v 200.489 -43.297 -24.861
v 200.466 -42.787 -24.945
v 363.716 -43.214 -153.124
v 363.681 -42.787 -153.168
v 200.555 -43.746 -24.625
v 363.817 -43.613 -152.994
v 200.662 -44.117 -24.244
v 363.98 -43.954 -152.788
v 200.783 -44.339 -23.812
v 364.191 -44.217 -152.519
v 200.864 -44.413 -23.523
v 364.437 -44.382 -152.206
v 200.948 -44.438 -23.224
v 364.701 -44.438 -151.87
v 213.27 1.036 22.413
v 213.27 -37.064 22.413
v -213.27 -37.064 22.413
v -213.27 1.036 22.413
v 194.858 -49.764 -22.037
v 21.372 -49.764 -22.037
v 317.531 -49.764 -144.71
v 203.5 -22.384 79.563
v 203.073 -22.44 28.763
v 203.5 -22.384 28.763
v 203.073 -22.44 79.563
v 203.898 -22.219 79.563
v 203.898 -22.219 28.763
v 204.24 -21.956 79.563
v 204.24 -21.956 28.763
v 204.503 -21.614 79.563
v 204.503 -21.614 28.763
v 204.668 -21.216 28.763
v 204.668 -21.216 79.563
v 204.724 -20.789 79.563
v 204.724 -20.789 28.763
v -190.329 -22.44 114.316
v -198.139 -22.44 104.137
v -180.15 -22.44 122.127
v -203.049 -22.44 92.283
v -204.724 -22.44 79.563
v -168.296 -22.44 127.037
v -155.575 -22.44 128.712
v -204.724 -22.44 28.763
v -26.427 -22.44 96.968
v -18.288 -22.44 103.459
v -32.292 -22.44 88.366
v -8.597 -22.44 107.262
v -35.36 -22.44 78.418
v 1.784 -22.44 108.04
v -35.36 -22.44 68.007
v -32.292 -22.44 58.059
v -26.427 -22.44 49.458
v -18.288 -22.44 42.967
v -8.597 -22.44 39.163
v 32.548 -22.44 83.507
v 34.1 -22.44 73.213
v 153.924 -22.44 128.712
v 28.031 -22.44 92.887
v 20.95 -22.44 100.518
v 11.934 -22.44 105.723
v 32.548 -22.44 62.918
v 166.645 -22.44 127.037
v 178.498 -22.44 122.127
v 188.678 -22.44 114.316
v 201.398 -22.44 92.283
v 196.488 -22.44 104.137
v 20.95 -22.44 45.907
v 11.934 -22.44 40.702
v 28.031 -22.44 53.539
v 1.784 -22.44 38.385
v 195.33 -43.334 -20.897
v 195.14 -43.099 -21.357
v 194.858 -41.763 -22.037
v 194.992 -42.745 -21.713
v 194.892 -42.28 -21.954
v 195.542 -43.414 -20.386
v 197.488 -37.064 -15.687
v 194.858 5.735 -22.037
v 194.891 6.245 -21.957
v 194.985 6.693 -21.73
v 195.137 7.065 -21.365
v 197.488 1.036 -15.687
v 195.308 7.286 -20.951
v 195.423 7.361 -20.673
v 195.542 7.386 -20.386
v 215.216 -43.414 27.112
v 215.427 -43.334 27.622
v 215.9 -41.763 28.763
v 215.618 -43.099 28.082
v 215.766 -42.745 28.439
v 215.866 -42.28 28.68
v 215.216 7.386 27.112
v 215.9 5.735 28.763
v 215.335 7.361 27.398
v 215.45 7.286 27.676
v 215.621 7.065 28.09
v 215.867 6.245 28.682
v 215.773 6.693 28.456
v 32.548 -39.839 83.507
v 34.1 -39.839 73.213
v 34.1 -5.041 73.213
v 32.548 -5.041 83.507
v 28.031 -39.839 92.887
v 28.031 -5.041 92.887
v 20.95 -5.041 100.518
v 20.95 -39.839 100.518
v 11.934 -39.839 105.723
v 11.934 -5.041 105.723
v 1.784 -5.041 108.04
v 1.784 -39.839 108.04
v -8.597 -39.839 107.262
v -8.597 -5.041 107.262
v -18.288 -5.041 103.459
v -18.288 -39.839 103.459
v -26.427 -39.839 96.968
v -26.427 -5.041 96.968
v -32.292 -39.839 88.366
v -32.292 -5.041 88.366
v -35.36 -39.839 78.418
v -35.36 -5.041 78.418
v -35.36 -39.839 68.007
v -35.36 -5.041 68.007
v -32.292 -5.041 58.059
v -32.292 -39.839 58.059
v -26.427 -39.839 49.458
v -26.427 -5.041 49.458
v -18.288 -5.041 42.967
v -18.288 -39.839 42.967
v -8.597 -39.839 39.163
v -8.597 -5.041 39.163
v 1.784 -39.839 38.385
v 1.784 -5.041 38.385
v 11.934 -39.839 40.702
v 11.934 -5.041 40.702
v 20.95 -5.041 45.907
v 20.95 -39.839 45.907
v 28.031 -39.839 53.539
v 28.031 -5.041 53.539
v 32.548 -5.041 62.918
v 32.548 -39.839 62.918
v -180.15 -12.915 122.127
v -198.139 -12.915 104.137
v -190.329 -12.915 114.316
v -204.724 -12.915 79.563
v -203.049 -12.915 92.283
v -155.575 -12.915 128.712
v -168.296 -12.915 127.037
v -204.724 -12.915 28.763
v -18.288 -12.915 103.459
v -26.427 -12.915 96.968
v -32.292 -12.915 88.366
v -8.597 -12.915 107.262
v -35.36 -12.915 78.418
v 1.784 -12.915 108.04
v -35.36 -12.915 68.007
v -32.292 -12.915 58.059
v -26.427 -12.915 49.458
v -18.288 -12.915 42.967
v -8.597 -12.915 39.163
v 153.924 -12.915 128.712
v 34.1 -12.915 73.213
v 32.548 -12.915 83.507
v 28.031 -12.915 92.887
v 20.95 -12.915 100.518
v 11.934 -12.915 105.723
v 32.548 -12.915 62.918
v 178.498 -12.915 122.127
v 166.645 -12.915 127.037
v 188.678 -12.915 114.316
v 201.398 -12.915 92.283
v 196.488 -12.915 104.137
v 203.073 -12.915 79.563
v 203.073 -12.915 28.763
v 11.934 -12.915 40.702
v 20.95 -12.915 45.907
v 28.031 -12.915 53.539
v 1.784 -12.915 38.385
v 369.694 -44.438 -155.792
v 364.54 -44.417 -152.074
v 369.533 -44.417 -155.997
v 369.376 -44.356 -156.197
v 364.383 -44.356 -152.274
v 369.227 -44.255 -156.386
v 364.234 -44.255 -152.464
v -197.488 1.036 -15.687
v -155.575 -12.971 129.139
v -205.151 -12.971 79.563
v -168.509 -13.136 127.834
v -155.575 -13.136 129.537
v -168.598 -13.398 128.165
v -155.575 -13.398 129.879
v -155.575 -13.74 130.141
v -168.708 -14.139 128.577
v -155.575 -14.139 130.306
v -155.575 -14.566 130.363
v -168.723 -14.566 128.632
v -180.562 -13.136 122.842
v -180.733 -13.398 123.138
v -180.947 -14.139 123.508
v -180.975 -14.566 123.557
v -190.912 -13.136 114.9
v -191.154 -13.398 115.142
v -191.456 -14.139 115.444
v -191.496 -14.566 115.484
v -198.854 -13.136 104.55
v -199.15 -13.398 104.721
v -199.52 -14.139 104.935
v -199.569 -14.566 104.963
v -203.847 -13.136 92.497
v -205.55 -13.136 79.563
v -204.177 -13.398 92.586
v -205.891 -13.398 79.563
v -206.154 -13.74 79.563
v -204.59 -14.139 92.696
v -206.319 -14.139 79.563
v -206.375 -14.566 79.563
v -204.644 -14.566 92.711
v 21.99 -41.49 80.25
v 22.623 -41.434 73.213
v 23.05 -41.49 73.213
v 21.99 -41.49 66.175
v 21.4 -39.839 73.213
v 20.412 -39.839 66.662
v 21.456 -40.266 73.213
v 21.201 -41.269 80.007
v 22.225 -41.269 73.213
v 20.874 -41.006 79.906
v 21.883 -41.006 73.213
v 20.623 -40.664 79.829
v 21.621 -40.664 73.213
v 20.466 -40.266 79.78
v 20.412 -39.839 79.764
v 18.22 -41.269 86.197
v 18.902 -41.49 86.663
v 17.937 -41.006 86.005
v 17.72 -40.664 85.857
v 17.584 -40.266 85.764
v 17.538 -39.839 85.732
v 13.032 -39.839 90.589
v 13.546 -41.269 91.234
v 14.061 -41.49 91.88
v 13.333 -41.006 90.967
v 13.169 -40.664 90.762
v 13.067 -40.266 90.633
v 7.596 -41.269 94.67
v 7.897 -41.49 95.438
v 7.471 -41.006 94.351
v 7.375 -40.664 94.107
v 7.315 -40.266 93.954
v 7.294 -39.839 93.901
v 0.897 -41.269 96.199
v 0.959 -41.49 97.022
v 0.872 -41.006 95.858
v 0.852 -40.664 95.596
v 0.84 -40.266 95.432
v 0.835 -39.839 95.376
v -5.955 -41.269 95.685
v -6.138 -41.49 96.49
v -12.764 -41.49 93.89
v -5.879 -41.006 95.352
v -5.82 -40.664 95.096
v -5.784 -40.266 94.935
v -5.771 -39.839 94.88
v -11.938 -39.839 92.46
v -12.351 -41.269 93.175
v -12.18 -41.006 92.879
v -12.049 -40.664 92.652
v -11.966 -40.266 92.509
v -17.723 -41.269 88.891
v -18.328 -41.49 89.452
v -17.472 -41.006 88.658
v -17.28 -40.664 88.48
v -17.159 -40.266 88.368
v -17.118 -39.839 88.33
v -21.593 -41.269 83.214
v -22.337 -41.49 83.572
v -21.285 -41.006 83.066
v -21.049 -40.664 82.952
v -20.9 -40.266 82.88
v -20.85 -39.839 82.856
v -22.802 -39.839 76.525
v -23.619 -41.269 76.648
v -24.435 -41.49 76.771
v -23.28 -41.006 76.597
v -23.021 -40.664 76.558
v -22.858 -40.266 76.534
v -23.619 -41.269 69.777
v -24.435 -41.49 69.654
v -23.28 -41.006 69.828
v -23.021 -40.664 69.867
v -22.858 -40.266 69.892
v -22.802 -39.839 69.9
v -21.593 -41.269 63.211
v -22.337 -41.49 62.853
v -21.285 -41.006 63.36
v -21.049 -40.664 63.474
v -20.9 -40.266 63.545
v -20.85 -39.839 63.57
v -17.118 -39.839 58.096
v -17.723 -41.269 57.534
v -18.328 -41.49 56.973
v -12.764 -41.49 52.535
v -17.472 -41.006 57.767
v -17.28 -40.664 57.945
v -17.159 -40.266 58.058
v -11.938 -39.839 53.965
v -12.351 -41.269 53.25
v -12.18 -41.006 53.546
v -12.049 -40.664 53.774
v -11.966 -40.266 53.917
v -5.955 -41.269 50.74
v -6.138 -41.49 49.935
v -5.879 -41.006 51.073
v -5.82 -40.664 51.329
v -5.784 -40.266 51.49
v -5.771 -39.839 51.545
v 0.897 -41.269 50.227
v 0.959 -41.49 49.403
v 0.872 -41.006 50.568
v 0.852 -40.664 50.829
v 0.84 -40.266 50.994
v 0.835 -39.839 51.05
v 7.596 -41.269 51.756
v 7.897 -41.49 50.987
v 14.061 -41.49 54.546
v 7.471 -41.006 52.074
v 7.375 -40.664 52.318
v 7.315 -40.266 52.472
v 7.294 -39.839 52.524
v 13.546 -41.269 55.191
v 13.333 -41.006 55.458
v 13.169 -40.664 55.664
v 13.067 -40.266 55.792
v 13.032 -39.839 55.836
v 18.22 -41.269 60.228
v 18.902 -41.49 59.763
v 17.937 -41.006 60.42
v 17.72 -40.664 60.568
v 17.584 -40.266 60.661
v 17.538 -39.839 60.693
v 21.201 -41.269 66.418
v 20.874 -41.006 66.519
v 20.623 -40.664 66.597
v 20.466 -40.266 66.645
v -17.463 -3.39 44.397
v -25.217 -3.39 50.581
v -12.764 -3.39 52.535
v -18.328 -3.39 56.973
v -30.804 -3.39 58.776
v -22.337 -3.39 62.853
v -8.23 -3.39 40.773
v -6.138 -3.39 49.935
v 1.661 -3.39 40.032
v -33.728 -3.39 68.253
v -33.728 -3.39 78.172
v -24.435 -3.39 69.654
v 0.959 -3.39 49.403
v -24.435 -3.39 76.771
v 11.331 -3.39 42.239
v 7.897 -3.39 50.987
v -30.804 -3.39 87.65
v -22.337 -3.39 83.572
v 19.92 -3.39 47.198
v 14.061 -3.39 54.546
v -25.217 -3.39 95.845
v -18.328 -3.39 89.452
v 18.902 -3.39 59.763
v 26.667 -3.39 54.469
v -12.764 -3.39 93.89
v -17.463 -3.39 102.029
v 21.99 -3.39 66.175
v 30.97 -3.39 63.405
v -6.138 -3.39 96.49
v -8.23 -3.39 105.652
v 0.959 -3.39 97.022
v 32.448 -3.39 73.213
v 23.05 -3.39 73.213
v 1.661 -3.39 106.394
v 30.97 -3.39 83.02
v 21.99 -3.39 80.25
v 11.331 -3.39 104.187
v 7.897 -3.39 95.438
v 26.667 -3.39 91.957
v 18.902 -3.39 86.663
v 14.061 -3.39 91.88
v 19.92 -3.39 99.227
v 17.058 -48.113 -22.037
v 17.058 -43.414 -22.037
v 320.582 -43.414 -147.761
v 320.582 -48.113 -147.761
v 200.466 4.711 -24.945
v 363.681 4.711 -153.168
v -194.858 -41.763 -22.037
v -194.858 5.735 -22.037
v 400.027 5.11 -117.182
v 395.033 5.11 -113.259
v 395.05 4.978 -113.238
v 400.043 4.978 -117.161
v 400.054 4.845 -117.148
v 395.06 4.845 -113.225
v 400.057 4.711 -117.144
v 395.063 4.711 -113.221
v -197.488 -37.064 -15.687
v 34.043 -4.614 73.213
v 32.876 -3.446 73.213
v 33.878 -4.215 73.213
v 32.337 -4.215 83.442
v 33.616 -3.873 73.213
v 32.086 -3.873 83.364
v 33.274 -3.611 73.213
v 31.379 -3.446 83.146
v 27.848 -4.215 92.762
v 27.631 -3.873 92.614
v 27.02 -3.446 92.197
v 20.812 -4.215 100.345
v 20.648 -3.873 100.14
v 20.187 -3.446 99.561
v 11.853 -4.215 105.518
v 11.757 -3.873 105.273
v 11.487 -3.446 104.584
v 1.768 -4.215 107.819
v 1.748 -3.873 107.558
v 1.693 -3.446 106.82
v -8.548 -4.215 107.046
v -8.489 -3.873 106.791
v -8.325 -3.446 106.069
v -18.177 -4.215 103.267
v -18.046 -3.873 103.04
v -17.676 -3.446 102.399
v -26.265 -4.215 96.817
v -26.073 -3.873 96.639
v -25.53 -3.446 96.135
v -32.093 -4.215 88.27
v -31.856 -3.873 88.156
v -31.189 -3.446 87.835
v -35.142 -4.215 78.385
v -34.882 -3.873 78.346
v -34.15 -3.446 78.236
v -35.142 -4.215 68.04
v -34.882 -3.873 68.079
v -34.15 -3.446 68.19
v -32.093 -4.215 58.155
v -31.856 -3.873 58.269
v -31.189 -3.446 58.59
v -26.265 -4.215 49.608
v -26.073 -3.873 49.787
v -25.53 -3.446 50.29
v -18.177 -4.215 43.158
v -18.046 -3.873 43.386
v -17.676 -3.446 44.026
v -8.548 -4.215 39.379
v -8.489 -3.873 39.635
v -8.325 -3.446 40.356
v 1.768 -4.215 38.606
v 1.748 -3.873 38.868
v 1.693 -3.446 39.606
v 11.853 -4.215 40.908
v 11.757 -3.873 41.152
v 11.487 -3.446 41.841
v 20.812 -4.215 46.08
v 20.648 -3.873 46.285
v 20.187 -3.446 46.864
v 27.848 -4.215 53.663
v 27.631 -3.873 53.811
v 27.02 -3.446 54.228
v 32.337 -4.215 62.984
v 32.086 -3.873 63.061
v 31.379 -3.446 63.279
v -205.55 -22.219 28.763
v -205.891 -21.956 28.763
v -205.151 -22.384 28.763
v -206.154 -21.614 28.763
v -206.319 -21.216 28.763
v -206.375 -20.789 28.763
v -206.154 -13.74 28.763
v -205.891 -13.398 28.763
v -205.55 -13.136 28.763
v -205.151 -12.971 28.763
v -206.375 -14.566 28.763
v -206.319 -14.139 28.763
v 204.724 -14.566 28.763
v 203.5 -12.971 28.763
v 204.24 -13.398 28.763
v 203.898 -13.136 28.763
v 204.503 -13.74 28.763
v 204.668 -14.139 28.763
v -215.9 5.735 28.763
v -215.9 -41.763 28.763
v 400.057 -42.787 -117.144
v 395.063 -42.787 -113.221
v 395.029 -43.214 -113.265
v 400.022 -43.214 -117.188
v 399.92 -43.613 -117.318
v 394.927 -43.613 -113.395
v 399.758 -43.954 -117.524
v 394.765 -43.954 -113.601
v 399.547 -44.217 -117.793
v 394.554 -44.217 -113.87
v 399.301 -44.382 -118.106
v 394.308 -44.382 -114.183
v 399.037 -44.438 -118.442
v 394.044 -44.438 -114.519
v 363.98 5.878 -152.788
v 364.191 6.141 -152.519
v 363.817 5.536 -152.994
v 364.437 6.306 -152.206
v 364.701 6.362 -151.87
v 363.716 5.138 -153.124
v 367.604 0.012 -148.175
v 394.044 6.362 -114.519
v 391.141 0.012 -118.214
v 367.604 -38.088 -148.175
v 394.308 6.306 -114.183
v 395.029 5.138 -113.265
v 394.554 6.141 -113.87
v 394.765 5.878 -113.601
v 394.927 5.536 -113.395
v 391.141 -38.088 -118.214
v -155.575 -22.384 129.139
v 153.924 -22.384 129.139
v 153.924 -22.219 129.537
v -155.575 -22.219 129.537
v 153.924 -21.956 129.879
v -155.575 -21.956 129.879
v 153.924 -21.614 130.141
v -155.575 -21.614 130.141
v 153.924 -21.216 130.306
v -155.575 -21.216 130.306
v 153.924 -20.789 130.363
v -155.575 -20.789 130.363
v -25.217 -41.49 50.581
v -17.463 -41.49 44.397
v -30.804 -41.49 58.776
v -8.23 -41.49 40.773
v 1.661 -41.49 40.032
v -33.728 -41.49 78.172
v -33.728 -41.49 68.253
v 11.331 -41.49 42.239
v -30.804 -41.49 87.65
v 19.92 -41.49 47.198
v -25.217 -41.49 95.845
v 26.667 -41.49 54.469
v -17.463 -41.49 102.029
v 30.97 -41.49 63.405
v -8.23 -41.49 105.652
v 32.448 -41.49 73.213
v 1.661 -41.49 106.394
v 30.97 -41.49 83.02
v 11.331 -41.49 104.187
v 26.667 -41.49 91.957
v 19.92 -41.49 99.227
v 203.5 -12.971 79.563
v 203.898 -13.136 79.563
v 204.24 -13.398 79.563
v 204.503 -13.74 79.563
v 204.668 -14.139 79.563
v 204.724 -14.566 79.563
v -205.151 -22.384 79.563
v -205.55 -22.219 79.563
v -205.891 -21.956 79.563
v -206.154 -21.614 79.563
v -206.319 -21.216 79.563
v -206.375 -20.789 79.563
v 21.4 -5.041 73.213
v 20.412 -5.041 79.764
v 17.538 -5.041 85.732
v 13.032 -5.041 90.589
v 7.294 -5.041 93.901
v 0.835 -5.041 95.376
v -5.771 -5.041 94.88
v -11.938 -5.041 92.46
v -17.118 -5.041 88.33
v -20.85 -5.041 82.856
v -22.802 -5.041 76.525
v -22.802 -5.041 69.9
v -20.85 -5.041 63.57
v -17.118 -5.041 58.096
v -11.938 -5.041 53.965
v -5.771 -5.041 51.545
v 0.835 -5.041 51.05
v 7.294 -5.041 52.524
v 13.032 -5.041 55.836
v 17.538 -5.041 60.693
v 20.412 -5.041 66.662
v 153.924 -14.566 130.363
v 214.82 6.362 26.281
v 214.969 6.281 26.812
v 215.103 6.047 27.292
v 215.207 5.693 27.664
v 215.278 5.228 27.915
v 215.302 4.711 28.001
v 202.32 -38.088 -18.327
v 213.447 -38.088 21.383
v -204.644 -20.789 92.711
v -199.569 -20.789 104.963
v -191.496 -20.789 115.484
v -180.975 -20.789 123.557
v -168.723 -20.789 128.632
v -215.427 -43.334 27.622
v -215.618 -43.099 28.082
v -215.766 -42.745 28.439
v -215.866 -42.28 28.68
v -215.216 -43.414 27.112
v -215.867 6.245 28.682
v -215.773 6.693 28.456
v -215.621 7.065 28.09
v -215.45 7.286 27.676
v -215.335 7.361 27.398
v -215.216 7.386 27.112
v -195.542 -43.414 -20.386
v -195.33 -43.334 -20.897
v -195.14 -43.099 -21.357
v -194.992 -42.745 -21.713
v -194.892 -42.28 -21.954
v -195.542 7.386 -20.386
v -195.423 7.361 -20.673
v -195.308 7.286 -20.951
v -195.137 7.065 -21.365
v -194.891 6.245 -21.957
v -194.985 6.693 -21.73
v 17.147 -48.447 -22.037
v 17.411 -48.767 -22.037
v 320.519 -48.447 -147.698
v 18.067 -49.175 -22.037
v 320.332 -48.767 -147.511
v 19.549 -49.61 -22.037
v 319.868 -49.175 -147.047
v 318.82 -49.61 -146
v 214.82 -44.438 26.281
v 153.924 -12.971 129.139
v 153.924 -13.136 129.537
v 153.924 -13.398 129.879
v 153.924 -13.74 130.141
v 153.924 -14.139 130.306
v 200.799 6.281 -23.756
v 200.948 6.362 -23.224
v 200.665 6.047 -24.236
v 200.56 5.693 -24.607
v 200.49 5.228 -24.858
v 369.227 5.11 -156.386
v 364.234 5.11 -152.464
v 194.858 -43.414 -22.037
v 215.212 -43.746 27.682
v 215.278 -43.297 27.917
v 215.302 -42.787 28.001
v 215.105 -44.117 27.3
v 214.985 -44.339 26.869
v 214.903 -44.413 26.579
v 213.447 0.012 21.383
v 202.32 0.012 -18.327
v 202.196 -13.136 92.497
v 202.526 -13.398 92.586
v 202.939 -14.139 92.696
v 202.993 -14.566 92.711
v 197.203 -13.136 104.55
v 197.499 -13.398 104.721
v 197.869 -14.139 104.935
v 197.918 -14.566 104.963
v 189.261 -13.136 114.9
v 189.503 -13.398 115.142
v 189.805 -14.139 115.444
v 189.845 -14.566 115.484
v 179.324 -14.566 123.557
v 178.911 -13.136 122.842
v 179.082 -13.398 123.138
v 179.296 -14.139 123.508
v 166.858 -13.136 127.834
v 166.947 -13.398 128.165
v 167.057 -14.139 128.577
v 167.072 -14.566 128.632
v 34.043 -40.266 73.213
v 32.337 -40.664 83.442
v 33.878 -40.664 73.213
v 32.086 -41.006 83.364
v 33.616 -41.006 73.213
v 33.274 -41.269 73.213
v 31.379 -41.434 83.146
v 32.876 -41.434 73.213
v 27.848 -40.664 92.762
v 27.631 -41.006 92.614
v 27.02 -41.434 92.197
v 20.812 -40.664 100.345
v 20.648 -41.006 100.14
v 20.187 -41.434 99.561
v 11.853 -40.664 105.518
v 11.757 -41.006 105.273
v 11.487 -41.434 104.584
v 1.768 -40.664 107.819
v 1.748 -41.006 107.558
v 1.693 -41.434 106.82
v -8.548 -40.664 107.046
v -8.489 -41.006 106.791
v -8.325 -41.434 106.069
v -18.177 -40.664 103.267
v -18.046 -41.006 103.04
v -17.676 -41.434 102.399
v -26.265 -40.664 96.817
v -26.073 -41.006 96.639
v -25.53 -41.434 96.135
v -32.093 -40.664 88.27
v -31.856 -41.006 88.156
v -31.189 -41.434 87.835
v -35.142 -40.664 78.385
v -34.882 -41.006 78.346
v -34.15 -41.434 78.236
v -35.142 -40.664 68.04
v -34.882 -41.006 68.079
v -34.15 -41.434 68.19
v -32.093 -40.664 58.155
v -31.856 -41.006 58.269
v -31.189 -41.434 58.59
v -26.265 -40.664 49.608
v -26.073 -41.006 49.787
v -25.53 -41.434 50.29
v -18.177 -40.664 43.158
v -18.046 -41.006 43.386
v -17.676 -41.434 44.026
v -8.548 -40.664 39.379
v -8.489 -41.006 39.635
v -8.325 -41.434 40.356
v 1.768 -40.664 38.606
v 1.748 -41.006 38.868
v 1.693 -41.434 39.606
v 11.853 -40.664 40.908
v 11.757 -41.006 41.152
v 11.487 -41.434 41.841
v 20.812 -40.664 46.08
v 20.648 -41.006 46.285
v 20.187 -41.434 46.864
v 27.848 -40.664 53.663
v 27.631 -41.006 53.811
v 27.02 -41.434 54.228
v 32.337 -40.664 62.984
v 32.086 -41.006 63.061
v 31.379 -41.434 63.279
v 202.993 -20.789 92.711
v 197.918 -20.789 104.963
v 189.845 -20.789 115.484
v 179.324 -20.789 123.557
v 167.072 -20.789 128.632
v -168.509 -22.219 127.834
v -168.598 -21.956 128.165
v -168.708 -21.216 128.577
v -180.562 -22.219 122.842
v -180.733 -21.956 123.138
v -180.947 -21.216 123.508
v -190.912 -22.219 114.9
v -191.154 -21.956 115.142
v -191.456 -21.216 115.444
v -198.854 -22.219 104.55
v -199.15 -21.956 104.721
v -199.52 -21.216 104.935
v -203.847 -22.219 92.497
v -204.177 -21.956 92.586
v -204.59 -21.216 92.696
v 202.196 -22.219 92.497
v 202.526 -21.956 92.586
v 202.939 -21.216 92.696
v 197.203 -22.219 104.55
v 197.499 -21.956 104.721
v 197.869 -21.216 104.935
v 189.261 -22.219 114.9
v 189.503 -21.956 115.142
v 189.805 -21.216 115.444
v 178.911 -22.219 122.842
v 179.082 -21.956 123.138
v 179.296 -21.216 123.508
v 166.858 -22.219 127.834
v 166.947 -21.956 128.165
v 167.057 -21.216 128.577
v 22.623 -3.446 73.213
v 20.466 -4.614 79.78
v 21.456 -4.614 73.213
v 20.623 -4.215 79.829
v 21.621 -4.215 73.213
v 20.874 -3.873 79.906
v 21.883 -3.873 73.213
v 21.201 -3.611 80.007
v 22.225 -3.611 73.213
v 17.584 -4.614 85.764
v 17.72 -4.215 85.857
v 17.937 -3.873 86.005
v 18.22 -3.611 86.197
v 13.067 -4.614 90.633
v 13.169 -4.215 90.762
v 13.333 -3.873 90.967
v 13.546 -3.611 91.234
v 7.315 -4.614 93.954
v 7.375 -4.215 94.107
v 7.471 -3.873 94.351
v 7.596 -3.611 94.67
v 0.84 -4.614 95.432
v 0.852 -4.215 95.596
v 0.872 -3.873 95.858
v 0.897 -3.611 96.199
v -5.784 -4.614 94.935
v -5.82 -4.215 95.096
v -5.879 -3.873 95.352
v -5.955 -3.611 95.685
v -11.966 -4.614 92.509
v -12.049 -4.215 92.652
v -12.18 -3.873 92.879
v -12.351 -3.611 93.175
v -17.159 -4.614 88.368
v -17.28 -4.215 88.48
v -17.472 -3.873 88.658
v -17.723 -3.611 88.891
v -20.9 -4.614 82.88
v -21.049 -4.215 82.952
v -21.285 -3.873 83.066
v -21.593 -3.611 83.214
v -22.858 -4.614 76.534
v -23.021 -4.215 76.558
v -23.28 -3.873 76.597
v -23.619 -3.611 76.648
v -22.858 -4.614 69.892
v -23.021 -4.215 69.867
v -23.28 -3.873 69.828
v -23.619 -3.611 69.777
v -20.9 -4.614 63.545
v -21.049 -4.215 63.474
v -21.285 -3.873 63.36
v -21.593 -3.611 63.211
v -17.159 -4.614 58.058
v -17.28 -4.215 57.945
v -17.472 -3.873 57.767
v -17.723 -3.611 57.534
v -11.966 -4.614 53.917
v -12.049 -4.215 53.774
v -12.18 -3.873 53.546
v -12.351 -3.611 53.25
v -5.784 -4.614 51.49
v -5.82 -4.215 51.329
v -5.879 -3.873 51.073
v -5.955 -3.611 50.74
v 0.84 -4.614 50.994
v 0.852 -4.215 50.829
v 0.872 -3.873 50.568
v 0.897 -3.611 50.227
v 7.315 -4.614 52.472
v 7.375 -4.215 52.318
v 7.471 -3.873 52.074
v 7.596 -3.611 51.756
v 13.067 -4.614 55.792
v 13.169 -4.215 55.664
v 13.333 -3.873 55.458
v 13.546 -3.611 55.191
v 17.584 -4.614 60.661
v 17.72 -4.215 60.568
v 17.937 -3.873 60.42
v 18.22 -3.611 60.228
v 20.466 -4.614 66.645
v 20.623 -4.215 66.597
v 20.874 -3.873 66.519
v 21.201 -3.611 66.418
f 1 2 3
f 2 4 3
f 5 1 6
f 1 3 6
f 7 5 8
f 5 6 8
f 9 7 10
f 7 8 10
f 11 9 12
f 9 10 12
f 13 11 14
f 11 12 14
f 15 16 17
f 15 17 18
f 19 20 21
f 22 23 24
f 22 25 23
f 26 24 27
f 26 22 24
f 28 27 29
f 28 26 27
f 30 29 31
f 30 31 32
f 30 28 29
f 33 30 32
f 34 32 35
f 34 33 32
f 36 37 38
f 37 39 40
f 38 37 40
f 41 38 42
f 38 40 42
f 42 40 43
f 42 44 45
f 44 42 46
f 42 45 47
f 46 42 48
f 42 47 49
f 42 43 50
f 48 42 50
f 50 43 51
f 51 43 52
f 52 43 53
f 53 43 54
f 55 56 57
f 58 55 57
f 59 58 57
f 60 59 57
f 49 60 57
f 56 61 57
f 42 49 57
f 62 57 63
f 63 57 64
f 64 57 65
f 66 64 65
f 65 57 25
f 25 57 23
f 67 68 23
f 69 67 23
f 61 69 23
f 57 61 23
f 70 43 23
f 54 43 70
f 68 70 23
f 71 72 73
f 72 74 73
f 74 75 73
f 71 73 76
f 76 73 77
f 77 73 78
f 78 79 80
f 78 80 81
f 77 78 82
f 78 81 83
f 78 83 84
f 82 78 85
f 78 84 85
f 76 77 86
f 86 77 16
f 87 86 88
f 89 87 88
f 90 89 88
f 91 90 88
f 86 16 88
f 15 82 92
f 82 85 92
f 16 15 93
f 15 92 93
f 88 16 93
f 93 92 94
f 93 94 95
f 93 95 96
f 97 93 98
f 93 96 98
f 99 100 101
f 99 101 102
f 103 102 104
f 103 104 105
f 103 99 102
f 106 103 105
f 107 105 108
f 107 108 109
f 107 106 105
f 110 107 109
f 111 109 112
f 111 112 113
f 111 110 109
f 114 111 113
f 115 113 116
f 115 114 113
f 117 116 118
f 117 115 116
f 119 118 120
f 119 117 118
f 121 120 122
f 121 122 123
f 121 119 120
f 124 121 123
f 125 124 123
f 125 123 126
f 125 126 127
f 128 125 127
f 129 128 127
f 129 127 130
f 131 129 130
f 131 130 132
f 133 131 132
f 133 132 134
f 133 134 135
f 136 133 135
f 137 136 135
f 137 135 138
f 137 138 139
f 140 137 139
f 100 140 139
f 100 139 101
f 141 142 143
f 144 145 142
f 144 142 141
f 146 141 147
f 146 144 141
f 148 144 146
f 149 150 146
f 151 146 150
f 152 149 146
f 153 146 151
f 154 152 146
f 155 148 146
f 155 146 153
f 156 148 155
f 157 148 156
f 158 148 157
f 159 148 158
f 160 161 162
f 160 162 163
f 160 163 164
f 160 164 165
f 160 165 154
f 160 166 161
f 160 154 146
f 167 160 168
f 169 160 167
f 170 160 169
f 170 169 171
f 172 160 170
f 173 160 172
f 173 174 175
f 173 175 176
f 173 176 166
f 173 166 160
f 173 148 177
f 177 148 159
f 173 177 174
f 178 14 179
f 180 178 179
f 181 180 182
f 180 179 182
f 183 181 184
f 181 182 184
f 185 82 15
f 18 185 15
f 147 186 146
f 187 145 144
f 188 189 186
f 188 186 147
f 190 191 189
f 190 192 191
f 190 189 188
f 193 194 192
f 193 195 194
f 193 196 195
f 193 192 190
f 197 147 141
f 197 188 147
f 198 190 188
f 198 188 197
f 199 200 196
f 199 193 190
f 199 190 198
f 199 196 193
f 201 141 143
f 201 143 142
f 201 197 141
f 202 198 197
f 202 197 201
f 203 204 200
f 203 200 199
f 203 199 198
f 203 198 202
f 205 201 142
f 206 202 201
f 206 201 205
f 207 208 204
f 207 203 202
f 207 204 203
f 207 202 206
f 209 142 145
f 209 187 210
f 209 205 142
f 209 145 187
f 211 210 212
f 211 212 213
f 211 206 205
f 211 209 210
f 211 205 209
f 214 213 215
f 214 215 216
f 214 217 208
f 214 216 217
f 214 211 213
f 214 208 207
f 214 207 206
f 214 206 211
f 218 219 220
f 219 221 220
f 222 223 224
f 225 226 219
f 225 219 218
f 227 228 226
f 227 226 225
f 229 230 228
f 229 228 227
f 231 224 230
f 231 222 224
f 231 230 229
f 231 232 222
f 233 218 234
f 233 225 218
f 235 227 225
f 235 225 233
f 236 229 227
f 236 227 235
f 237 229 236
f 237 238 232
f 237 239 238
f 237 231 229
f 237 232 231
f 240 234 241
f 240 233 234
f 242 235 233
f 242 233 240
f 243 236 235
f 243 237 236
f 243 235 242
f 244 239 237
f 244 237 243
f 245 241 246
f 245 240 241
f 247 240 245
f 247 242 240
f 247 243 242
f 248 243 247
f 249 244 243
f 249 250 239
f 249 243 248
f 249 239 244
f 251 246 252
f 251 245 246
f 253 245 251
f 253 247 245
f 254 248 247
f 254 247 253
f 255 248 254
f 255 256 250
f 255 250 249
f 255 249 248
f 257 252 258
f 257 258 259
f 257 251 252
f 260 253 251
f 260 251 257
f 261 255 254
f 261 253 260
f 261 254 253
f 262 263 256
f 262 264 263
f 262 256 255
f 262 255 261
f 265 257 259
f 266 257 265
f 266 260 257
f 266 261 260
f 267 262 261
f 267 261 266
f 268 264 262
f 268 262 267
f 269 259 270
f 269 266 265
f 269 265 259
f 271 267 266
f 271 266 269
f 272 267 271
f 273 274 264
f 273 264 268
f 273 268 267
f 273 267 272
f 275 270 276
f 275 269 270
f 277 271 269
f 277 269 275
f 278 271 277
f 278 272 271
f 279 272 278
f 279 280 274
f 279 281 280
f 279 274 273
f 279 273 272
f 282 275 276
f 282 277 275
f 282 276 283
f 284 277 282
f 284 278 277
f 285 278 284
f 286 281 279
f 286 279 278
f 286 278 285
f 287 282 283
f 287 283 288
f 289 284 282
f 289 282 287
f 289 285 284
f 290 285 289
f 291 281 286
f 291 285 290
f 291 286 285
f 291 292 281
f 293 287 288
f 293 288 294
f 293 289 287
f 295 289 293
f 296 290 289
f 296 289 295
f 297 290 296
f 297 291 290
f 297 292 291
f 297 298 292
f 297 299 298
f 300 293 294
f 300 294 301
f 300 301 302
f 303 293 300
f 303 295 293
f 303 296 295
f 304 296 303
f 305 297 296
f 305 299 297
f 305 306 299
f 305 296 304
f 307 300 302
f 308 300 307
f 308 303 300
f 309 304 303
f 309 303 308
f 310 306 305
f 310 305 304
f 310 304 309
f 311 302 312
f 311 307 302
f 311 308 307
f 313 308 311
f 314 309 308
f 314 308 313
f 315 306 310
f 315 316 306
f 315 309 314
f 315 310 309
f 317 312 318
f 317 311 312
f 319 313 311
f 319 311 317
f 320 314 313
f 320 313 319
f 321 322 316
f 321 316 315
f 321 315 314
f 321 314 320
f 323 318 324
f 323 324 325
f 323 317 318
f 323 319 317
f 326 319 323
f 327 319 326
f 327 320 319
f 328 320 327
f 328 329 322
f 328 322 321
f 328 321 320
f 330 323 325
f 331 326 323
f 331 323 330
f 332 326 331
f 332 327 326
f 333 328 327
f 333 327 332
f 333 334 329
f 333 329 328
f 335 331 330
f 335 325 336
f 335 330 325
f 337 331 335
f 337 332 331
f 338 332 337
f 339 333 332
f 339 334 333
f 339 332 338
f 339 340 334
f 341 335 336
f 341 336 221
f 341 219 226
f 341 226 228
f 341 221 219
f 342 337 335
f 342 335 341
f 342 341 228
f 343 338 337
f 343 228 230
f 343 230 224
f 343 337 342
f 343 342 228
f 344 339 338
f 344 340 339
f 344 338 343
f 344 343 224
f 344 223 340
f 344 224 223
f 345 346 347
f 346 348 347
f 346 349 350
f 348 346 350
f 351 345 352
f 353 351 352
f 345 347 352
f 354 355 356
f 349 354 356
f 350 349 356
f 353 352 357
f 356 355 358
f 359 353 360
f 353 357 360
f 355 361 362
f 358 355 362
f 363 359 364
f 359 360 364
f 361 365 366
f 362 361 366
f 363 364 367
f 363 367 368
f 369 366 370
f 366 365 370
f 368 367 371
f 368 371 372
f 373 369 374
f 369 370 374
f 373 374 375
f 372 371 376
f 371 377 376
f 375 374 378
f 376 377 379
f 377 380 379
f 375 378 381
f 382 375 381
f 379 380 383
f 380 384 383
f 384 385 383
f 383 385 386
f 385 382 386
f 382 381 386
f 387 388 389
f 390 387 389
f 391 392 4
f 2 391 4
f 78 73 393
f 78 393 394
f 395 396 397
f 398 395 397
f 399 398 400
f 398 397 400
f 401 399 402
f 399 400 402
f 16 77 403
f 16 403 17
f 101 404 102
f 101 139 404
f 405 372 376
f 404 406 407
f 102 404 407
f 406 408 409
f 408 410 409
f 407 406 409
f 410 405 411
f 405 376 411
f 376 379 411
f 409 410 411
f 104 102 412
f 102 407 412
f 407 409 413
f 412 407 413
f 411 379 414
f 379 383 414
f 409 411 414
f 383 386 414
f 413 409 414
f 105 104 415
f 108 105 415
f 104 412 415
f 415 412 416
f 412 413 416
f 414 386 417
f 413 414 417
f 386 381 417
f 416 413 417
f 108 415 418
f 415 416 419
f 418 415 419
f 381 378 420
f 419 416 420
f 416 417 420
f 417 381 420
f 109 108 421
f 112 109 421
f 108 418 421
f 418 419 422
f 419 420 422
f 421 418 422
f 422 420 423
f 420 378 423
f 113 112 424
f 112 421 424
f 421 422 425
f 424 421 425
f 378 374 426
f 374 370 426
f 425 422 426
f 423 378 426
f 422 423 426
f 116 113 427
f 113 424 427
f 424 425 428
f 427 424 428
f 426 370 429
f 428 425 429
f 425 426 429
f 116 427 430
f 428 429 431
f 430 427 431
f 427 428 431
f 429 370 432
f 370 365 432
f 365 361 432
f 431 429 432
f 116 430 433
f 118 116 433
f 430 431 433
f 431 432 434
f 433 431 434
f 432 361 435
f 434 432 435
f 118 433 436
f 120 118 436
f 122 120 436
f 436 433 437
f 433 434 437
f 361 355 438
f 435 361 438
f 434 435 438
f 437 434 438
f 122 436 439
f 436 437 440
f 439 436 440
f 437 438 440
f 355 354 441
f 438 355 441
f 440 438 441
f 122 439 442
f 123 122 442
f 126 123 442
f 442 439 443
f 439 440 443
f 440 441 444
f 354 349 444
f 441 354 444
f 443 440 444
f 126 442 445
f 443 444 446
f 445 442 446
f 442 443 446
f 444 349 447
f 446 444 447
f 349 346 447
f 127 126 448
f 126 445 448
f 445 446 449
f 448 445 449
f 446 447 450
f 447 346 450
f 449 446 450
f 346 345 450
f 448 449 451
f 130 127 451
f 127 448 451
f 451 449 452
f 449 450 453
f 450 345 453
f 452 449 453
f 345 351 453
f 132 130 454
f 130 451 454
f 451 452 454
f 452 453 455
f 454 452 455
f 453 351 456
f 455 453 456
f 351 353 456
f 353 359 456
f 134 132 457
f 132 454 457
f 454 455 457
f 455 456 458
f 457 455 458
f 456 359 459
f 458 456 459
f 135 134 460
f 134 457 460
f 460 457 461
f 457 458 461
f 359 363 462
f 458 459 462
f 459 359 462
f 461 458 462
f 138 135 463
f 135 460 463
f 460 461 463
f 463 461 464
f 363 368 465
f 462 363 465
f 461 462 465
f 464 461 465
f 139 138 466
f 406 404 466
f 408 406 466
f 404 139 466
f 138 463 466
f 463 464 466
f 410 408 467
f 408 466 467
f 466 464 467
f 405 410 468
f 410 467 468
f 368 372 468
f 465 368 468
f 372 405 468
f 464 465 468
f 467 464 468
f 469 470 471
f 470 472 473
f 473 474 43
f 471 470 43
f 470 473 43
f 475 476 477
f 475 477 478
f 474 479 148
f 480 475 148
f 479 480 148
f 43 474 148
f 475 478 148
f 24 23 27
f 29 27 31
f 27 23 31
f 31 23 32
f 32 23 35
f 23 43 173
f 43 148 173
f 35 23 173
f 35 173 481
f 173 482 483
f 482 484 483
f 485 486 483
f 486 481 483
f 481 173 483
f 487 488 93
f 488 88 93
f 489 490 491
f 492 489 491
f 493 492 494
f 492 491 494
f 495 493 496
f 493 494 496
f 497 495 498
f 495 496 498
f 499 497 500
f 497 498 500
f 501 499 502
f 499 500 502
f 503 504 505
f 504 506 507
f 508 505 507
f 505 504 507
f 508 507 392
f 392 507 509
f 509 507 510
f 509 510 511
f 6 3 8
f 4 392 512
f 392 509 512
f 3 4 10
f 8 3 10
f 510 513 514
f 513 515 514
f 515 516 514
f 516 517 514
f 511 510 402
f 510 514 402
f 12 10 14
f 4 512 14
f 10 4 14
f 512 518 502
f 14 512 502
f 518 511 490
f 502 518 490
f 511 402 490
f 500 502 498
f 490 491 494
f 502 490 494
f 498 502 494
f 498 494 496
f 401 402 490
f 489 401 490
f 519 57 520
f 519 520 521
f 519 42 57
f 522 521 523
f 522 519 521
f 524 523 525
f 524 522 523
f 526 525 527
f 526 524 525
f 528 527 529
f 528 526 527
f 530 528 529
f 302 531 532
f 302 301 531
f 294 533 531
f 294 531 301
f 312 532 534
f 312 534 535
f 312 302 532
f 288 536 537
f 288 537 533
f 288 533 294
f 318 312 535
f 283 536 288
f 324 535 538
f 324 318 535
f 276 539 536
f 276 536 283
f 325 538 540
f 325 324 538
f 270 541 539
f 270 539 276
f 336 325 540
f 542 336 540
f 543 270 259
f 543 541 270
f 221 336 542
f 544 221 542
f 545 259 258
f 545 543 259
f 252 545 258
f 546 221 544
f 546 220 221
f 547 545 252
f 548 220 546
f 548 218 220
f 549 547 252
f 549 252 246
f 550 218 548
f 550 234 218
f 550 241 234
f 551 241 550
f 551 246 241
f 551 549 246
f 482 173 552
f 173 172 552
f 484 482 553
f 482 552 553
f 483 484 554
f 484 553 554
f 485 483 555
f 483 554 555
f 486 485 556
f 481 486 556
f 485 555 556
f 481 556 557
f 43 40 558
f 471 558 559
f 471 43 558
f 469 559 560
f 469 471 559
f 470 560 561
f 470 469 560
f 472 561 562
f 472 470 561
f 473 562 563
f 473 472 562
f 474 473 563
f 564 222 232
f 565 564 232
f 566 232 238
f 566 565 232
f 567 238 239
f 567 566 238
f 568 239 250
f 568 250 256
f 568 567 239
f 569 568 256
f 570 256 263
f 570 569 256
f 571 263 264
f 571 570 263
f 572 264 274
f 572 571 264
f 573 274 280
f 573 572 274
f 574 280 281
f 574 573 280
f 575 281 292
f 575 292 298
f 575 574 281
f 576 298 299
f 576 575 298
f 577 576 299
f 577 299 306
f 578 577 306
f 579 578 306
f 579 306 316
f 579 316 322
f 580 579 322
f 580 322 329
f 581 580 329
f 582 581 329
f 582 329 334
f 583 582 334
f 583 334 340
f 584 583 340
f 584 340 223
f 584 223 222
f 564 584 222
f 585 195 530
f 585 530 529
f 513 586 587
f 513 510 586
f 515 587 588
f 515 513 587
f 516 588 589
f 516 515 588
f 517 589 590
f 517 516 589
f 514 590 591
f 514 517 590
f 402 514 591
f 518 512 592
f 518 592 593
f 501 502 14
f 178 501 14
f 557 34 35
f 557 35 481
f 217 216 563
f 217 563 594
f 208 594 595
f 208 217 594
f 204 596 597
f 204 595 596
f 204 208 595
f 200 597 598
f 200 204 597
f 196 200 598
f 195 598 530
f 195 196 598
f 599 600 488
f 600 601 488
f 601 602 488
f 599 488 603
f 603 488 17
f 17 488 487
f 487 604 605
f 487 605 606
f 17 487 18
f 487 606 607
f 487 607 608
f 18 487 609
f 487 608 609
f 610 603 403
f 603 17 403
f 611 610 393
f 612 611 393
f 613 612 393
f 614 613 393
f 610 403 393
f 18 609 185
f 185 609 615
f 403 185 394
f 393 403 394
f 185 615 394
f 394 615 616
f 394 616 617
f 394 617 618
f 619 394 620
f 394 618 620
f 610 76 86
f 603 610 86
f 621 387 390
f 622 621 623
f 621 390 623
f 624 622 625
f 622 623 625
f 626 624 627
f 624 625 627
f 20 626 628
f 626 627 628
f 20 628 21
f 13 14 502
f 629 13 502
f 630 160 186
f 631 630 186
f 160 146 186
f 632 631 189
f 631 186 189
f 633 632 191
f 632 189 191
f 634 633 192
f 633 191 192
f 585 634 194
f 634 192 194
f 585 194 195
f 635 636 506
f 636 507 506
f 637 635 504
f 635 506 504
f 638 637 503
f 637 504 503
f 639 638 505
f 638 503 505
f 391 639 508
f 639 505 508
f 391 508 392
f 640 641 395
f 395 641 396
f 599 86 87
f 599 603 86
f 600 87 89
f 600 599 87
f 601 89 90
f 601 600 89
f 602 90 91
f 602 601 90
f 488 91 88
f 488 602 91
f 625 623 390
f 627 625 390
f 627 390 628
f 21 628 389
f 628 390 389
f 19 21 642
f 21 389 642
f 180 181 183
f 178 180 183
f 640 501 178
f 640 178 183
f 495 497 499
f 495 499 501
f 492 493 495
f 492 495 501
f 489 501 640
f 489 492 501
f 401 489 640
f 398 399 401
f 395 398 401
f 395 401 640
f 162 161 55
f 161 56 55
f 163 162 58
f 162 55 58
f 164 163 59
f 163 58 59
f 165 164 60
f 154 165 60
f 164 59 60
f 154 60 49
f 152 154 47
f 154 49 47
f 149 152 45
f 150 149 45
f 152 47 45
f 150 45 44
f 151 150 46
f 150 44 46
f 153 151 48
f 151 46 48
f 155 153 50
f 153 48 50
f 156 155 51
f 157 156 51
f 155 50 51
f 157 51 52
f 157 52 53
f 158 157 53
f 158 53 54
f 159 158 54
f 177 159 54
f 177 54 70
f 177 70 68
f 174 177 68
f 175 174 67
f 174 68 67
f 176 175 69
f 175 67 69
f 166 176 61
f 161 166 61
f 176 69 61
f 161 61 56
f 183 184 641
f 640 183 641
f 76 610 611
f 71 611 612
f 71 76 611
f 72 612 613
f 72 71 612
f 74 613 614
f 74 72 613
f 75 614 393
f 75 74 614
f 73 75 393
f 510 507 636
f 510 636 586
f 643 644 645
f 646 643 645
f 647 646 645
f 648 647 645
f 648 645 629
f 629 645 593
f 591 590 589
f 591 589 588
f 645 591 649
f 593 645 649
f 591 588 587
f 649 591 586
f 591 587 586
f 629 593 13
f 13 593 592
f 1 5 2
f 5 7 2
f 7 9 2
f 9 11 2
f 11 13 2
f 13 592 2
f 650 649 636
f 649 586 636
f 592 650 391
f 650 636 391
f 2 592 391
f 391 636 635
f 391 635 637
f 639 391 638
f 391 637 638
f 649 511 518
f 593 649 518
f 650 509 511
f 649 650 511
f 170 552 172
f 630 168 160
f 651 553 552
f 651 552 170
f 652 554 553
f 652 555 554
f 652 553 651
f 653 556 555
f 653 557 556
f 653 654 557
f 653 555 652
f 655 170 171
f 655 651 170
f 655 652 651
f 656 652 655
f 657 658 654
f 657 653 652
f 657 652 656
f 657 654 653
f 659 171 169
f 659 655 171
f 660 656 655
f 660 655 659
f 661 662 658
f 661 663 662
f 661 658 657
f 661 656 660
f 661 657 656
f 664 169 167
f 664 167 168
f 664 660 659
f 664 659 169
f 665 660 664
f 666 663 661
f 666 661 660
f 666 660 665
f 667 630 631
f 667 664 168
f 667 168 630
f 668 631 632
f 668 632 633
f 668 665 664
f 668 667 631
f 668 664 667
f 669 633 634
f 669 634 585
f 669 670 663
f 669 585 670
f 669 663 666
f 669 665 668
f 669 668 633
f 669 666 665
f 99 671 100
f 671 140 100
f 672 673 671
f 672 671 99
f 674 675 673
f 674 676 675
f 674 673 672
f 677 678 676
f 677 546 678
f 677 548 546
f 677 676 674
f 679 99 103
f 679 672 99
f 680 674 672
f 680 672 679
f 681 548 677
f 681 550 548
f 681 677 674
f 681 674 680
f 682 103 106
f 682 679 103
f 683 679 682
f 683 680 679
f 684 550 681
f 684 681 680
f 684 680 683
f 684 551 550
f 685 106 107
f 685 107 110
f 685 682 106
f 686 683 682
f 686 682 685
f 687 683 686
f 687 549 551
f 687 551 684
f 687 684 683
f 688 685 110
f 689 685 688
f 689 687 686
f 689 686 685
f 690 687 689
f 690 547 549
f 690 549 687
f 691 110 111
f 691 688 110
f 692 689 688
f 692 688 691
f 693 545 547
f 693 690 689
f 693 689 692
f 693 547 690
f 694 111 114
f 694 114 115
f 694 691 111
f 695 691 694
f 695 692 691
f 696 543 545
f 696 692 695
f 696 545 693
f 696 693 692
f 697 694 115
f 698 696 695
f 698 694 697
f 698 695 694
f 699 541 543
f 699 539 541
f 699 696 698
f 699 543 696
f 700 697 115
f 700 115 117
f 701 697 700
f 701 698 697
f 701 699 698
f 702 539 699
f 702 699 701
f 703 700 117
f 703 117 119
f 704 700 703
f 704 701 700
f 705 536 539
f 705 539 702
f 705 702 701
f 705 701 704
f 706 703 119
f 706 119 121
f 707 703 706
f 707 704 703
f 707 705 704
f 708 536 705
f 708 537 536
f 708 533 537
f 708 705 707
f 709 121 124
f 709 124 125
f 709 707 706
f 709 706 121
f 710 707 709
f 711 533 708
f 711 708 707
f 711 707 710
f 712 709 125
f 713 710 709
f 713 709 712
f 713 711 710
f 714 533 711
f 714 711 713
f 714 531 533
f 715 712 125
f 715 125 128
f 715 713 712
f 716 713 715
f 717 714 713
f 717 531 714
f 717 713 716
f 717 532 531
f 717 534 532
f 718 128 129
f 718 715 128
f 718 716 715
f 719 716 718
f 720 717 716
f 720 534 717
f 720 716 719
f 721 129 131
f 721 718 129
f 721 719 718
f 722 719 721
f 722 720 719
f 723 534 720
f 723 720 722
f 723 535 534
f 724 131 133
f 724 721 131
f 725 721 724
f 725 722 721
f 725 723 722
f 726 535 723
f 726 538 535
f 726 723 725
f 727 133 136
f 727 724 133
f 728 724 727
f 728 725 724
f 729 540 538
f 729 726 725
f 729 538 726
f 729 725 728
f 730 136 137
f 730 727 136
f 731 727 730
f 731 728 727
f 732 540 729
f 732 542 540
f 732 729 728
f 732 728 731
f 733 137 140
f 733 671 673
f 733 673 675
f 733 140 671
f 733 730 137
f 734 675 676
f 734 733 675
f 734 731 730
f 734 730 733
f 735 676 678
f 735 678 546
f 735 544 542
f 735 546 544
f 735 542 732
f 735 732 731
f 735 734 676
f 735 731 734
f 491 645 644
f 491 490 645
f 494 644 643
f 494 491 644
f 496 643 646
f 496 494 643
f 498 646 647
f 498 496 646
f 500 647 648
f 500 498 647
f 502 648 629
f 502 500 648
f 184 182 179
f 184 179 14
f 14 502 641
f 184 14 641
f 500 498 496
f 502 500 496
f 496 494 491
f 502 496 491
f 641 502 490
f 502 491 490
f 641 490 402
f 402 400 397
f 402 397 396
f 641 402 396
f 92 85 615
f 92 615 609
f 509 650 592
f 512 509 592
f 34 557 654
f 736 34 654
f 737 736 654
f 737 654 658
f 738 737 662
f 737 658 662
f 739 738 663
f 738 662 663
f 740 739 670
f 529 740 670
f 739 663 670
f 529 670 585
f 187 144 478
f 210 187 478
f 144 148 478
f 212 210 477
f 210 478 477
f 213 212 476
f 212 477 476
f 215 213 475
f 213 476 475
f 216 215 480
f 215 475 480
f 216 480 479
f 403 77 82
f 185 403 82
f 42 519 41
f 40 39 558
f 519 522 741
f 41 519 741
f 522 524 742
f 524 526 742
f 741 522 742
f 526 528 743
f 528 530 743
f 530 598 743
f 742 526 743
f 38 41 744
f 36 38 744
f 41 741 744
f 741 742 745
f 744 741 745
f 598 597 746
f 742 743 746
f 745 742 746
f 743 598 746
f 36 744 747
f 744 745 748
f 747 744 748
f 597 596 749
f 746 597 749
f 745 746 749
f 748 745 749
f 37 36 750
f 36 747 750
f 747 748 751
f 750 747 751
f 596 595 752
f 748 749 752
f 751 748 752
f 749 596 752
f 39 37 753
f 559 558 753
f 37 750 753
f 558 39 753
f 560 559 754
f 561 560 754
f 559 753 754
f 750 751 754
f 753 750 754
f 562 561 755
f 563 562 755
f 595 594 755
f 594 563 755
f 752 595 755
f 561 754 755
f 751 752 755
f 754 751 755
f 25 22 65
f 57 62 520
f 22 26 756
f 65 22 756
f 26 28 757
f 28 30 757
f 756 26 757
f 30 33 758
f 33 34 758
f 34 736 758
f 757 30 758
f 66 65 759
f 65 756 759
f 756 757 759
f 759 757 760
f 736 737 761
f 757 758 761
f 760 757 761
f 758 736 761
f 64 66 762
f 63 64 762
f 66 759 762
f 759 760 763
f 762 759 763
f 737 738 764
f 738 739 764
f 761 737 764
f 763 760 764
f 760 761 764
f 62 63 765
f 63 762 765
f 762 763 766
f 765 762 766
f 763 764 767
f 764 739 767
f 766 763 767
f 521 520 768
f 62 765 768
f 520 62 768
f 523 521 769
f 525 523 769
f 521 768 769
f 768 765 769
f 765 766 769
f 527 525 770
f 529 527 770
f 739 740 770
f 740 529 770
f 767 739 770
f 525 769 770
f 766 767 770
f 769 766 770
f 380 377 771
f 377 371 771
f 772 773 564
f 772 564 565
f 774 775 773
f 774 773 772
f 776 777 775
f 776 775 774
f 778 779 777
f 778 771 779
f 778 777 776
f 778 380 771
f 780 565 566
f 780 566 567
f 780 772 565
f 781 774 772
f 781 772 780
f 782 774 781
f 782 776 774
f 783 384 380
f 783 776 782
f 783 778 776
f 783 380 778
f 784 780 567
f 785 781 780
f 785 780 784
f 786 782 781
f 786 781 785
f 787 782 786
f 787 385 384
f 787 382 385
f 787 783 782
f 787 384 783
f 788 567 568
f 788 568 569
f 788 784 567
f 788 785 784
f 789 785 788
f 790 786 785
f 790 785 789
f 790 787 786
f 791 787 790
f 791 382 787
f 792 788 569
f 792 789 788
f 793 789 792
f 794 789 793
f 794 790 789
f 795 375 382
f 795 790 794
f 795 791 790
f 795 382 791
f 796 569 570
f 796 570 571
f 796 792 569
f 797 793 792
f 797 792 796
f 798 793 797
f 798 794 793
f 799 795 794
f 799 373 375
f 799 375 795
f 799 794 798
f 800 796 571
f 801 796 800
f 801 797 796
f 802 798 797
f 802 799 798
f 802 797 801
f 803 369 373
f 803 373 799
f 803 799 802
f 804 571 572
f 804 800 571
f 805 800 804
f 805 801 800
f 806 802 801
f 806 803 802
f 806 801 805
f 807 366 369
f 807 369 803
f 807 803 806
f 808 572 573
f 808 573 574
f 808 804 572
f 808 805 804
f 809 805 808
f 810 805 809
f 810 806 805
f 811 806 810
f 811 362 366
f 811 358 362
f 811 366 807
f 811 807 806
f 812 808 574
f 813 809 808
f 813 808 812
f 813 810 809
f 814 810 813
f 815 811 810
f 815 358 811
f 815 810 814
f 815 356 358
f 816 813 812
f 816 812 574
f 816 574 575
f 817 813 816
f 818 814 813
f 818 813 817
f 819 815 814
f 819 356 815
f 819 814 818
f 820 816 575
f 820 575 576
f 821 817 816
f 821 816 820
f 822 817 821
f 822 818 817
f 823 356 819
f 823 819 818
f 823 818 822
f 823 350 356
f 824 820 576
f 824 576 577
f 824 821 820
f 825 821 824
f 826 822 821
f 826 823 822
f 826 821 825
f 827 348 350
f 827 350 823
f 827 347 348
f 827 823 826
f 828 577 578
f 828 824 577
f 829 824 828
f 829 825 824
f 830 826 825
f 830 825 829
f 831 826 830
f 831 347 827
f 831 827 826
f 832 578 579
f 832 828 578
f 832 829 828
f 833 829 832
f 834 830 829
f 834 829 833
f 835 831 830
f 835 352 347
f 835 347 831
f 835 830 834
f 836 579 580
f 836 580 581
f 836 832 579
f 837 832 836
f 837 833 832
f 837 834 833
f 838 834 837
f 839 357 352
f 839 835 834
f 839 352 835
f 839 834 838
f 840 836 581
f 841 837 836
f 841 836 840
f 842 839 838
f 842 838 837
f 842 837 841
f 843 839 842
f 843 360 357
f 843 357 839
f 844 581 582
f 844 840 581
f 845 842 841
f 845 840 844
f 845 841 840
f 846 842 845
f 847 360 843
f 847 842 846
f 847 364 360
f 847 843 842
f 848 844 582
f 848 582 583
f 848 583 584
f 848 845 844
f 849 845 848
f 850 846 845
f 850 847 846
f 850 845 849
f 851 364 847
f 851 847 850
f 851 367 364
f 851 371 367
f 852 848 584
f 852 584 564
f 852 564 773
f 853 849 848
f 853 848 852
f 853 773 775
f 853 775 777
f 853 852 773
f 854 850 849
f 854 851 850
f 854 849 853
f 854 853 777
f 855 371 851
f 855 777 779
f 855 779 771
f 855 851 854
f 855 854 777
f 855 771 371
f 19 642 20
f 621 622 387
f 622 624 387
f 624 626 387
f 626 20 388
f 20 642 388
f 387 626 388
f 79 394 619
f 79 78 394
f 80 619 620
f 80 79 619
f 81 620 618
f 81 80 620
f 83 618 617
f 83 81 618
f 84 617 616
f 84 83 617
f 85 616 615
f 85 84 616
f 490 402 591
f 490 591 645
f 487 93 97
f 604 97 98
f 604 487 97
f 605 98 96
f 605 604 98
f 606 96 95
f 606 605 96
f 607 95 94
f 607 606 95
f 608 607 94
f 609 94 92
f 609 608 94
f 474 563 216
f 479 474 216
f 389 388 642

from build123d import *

# Parameters (mm, degrees)
F0_W      = 50.8
F0_H      = 50.8
F0_W_2    = 38.0999986082
F0_H_2    = 38.0999993041
F1_DEPTH  = 215.9
F3_DEPTH  = 50.801
F6_W      = 50.8
F6_H      = 50.8
F6_W_2    = 38.1000041962
F6_H_2    = 38.1000041962
F7_DEPTH  = 228.6
F9_DEPTH  = 50.801
F11_DEPTH = 6.35
F12_W     = 411.099
F12_H     = 9.525
F13_DEPTH = 101.6
F14_R     = 50.8
F15_R     = 22.225
F16_DEPTH = 25.4
F17_R     = 34.925
F17_R_2   = 22.225
F18_DEPTH = 19.05
F20_R     = 1.651
F20_2_R   = 1.651
F20_3_R   = 1.651
F20_4_R   = 1.651
F21_R     = 1.651
F22_W     = 38.1000041962
F22_H     = 38.1000041962
F23_DEPTH = 6.35


with BuildPart() as f1:
    # F0 (on Right) → F1 (new body, symmetric)
    with BuildSketch(Plane.YZ):
        with Locations((-18.0143257603, 3.3626770601)):
            Rectangle(F0_W, F0_H)
        with Locations((-18.0143257603, 3.362677408)):
            Rectangle(F0_W_2, F0_H_2, mode=Mode.SUBTRACT)
    extrude(amount=F1_DEPTH, both=True)

    # F2 (on face) → F3 (cut, through all)
    with BuildSketch(Plane(origin=(0, 7.3856742397, 0), x_dir=(-1, 0, 0), z_dir=(0, 1, 0))):
        Polygon((-194.8579510314, -22.0373229399), (-215.9, 28.7626770601), (-215.9, -22.0373229399), align=None)
        Polygon((215.9, -22.0373229399), (215.9, 28.7626770601), (194.8579510314, -22.0373229399), align=None)
    extrude(amount=-F3_DEPTH, mode=Mode.SUBTRACT)

    # F20
    f20_edges = [f1.edges().sort_by_distance(p)[0] for p in [
        (0, -43.414326, -22.037323),
        (0, -43.414326, 28.762677),
        (0, 7.385674, -22.037323),
        (0, 7.385674, 28.762677),
    ]]
    fillet(f20_edges, radius=F20_R)


with BuildPart() as f7:
    # F6 (on face) → F7 (new body)
    with BuildSketch(Plane(origin=(119.5313421825, 0, -93.9048466977), x_dir=(0, -1, 0), z_dir=(-0.7863587226, 0, 0.6177701509))):
        with Locations((19.0380490385, 129.6261847019)):
            Rectangle(F6_W, F6_H)
        with Locations((19.0380490385, 129.6261847019)):
            Rectangle(F6_W_2, F6_H_2, mode=Mode.SUBTRACT)
    extrude(amount=-F7_DEPTH)

    # F8 (on face) → F9 (cut, through all)
    with BuildSketch(Plane(origin=(0, 6.3619509615, 0), x_dir=(-1, 0, 0), z_dir=(0, 1, 0))):
        Polygon((-183.9191680339, -11.9456772311), (-215.3018916998, 28.0013458784), (-200.4657667823, -24.9448269977), align=None)
    extrude(amount=-F9_DEPTH, mode=Mode.SUBTRACT)

    # F20#2
    f20_2_edges = [f7.edges().sort_by_distance(p)[0] for p in [
        (282.073269, -44.438049, -89.05638),
        (305.182694, -44.438049, -42.609782),
        (305.182694, 6.361951, -42.609782),
        (282.073269, 6.361951, -89.05638),
    ]]
    fillet(f20_2_edges, radius=F20_2_R)


with BuildPart() as f11:
    # F10 (on face) → F11 (new body)
    with BuildSketch(Plane.XZ.offset(43.4143257603)):
        Polygon((320.5815367264, -147.7609086349), (194.8579510314, -22.0373229399), (17.0579510314, -22.0373229399), align=None)
    extrude(amount=F11_DEPTH)

    # F20#3
    f20_3_edges = [f11.edges().sort_by_distance(p)[0] for p in [
        (168.819744, -49.764326, -84.899116),
    ]]
    fillet(f20_3_edges, radius=F20_3_R)


with BuildPart() as f13:
    # F12 (on face) → F13 (new body)
    with BuildSketch(Plane.XY.offset(28.7626770601)):
        with Locations((-0.8255, -17.6774282008)):
            Rectangle(F12_W, F12_H)
    extrude(amount=F13_DEPTH)

    # F14
    f14_edges = [f13.edges().sort_by_distance(p)[0] for p in [
        (-206.375, -17.677428, 130.362677),
        (204.724, -17.677428, 130.362677),
    ]]
    fillet(f14_edges, radius=F14_R)

    # F15 (on face) → F16 (cut)
    with BuildSketch(Plane.XZ.offset(22.4399282008)):
        with Locations((-0.8255, 73.2126770601)):
            Circle(F15_R)
    extrude(amount=-F16_DEPTH, mode=Mode.SUBTRACT)


with BuildPart() as f18:
    # F17 (on face) → F18 (new body, symmetric)
    with BuildSketch(Plane.XZ.offset(22.4399282008)):
        with Locations((-0.8255, 73.2126770601)):
            Circle(F17_R)
        with Locations((-0.8255, 73.2126770601)):
            Circle(F17_R_2, mode=Mode.SUBTRACT)
    extrude(amount=F18_DEPTH, both=True)


with BuildPart() as f13_1:
    add(f13.part)

    # F19: cut F18
    add(f18.part, mode=Mode.SUBTRACT)

    # F20#4
    f20_4_edges = [f13_1.edges().sort_by_distance(p)[0] for p in [
        (204.724, -12.914928, 54.162677),
        (189.845024, -12.914928, 115.483702),
        (204.724, -22.439928, 54.162677),
    ]]
    fillet(f20_4_edges, radius=F20_4_R)


with BuildPart() as f18_1:
    add(f18.part)

    # F21
    f21_edges = [f18_1.edges().sort_by_distance(p)[0] for p in [
        (-23.0505, -3.389928, 73.212677),
        (-35.7505, -3.389928, 73.212677),
        (-23.0505, -41.489928, 73.212677),
        (-35.7505, -41.489928, 73.212677),
    ]]
    fillet(f21_edges, radius=F21_R)


with BuildPart() as f23:
    # F22 (on face) → F23 (new body)
    with BuildSketch(Plane(origin=(299.2929461753, 0, -235.1271031941), x_dir=(0, 1, 0), z_dir=(0.7863587226, 0, -0.6177701509))):
        with BuildLine():
            Line((5.1096215189, 105.1218711495), (5.1096215189, 154.9773278874))
            ThreePointArc((5.1096215189, 154.9773278874), (4.9117775046, 155.0139249802), (4.7109509615, 155.0261847019))
            Line((4.7109509615, 155.0261847019), (-42.7870490385, 155.0261847019))
            ThreePointArc((-42.7870490385, 155.0261847019), (-43.9544823342, 154.5426179977), (-44.4380490385, 153.3751847019))
            Line((-44.4380490385, 153.3751847019), (-44.4380490385, 105.8771847019))
            ThreePointArc((-44.4380490385, 105.8771847019), (-44.3916713568, 105.4886126807), (-44.2551438711, 105.1218711495))
            Line((-44.2551438711, 105.1218711495), (5.1096215189, 105.1218711495))
        make_face()
        with Locations((-19.0380490385, 129.6261847019)):
            Rectangle(F22_W, F22_H, mode=Mode.SUBTRACT)
        with Locations((-19.0380490385, 129.6261847019)):
            Rectangle(F22_W, F22_H)
    extrude(amount=F23_DEPTH)


solid = Compound([f1.part, f7.part, f11.part, f13_1.part, f18_1.part, f23.part])
